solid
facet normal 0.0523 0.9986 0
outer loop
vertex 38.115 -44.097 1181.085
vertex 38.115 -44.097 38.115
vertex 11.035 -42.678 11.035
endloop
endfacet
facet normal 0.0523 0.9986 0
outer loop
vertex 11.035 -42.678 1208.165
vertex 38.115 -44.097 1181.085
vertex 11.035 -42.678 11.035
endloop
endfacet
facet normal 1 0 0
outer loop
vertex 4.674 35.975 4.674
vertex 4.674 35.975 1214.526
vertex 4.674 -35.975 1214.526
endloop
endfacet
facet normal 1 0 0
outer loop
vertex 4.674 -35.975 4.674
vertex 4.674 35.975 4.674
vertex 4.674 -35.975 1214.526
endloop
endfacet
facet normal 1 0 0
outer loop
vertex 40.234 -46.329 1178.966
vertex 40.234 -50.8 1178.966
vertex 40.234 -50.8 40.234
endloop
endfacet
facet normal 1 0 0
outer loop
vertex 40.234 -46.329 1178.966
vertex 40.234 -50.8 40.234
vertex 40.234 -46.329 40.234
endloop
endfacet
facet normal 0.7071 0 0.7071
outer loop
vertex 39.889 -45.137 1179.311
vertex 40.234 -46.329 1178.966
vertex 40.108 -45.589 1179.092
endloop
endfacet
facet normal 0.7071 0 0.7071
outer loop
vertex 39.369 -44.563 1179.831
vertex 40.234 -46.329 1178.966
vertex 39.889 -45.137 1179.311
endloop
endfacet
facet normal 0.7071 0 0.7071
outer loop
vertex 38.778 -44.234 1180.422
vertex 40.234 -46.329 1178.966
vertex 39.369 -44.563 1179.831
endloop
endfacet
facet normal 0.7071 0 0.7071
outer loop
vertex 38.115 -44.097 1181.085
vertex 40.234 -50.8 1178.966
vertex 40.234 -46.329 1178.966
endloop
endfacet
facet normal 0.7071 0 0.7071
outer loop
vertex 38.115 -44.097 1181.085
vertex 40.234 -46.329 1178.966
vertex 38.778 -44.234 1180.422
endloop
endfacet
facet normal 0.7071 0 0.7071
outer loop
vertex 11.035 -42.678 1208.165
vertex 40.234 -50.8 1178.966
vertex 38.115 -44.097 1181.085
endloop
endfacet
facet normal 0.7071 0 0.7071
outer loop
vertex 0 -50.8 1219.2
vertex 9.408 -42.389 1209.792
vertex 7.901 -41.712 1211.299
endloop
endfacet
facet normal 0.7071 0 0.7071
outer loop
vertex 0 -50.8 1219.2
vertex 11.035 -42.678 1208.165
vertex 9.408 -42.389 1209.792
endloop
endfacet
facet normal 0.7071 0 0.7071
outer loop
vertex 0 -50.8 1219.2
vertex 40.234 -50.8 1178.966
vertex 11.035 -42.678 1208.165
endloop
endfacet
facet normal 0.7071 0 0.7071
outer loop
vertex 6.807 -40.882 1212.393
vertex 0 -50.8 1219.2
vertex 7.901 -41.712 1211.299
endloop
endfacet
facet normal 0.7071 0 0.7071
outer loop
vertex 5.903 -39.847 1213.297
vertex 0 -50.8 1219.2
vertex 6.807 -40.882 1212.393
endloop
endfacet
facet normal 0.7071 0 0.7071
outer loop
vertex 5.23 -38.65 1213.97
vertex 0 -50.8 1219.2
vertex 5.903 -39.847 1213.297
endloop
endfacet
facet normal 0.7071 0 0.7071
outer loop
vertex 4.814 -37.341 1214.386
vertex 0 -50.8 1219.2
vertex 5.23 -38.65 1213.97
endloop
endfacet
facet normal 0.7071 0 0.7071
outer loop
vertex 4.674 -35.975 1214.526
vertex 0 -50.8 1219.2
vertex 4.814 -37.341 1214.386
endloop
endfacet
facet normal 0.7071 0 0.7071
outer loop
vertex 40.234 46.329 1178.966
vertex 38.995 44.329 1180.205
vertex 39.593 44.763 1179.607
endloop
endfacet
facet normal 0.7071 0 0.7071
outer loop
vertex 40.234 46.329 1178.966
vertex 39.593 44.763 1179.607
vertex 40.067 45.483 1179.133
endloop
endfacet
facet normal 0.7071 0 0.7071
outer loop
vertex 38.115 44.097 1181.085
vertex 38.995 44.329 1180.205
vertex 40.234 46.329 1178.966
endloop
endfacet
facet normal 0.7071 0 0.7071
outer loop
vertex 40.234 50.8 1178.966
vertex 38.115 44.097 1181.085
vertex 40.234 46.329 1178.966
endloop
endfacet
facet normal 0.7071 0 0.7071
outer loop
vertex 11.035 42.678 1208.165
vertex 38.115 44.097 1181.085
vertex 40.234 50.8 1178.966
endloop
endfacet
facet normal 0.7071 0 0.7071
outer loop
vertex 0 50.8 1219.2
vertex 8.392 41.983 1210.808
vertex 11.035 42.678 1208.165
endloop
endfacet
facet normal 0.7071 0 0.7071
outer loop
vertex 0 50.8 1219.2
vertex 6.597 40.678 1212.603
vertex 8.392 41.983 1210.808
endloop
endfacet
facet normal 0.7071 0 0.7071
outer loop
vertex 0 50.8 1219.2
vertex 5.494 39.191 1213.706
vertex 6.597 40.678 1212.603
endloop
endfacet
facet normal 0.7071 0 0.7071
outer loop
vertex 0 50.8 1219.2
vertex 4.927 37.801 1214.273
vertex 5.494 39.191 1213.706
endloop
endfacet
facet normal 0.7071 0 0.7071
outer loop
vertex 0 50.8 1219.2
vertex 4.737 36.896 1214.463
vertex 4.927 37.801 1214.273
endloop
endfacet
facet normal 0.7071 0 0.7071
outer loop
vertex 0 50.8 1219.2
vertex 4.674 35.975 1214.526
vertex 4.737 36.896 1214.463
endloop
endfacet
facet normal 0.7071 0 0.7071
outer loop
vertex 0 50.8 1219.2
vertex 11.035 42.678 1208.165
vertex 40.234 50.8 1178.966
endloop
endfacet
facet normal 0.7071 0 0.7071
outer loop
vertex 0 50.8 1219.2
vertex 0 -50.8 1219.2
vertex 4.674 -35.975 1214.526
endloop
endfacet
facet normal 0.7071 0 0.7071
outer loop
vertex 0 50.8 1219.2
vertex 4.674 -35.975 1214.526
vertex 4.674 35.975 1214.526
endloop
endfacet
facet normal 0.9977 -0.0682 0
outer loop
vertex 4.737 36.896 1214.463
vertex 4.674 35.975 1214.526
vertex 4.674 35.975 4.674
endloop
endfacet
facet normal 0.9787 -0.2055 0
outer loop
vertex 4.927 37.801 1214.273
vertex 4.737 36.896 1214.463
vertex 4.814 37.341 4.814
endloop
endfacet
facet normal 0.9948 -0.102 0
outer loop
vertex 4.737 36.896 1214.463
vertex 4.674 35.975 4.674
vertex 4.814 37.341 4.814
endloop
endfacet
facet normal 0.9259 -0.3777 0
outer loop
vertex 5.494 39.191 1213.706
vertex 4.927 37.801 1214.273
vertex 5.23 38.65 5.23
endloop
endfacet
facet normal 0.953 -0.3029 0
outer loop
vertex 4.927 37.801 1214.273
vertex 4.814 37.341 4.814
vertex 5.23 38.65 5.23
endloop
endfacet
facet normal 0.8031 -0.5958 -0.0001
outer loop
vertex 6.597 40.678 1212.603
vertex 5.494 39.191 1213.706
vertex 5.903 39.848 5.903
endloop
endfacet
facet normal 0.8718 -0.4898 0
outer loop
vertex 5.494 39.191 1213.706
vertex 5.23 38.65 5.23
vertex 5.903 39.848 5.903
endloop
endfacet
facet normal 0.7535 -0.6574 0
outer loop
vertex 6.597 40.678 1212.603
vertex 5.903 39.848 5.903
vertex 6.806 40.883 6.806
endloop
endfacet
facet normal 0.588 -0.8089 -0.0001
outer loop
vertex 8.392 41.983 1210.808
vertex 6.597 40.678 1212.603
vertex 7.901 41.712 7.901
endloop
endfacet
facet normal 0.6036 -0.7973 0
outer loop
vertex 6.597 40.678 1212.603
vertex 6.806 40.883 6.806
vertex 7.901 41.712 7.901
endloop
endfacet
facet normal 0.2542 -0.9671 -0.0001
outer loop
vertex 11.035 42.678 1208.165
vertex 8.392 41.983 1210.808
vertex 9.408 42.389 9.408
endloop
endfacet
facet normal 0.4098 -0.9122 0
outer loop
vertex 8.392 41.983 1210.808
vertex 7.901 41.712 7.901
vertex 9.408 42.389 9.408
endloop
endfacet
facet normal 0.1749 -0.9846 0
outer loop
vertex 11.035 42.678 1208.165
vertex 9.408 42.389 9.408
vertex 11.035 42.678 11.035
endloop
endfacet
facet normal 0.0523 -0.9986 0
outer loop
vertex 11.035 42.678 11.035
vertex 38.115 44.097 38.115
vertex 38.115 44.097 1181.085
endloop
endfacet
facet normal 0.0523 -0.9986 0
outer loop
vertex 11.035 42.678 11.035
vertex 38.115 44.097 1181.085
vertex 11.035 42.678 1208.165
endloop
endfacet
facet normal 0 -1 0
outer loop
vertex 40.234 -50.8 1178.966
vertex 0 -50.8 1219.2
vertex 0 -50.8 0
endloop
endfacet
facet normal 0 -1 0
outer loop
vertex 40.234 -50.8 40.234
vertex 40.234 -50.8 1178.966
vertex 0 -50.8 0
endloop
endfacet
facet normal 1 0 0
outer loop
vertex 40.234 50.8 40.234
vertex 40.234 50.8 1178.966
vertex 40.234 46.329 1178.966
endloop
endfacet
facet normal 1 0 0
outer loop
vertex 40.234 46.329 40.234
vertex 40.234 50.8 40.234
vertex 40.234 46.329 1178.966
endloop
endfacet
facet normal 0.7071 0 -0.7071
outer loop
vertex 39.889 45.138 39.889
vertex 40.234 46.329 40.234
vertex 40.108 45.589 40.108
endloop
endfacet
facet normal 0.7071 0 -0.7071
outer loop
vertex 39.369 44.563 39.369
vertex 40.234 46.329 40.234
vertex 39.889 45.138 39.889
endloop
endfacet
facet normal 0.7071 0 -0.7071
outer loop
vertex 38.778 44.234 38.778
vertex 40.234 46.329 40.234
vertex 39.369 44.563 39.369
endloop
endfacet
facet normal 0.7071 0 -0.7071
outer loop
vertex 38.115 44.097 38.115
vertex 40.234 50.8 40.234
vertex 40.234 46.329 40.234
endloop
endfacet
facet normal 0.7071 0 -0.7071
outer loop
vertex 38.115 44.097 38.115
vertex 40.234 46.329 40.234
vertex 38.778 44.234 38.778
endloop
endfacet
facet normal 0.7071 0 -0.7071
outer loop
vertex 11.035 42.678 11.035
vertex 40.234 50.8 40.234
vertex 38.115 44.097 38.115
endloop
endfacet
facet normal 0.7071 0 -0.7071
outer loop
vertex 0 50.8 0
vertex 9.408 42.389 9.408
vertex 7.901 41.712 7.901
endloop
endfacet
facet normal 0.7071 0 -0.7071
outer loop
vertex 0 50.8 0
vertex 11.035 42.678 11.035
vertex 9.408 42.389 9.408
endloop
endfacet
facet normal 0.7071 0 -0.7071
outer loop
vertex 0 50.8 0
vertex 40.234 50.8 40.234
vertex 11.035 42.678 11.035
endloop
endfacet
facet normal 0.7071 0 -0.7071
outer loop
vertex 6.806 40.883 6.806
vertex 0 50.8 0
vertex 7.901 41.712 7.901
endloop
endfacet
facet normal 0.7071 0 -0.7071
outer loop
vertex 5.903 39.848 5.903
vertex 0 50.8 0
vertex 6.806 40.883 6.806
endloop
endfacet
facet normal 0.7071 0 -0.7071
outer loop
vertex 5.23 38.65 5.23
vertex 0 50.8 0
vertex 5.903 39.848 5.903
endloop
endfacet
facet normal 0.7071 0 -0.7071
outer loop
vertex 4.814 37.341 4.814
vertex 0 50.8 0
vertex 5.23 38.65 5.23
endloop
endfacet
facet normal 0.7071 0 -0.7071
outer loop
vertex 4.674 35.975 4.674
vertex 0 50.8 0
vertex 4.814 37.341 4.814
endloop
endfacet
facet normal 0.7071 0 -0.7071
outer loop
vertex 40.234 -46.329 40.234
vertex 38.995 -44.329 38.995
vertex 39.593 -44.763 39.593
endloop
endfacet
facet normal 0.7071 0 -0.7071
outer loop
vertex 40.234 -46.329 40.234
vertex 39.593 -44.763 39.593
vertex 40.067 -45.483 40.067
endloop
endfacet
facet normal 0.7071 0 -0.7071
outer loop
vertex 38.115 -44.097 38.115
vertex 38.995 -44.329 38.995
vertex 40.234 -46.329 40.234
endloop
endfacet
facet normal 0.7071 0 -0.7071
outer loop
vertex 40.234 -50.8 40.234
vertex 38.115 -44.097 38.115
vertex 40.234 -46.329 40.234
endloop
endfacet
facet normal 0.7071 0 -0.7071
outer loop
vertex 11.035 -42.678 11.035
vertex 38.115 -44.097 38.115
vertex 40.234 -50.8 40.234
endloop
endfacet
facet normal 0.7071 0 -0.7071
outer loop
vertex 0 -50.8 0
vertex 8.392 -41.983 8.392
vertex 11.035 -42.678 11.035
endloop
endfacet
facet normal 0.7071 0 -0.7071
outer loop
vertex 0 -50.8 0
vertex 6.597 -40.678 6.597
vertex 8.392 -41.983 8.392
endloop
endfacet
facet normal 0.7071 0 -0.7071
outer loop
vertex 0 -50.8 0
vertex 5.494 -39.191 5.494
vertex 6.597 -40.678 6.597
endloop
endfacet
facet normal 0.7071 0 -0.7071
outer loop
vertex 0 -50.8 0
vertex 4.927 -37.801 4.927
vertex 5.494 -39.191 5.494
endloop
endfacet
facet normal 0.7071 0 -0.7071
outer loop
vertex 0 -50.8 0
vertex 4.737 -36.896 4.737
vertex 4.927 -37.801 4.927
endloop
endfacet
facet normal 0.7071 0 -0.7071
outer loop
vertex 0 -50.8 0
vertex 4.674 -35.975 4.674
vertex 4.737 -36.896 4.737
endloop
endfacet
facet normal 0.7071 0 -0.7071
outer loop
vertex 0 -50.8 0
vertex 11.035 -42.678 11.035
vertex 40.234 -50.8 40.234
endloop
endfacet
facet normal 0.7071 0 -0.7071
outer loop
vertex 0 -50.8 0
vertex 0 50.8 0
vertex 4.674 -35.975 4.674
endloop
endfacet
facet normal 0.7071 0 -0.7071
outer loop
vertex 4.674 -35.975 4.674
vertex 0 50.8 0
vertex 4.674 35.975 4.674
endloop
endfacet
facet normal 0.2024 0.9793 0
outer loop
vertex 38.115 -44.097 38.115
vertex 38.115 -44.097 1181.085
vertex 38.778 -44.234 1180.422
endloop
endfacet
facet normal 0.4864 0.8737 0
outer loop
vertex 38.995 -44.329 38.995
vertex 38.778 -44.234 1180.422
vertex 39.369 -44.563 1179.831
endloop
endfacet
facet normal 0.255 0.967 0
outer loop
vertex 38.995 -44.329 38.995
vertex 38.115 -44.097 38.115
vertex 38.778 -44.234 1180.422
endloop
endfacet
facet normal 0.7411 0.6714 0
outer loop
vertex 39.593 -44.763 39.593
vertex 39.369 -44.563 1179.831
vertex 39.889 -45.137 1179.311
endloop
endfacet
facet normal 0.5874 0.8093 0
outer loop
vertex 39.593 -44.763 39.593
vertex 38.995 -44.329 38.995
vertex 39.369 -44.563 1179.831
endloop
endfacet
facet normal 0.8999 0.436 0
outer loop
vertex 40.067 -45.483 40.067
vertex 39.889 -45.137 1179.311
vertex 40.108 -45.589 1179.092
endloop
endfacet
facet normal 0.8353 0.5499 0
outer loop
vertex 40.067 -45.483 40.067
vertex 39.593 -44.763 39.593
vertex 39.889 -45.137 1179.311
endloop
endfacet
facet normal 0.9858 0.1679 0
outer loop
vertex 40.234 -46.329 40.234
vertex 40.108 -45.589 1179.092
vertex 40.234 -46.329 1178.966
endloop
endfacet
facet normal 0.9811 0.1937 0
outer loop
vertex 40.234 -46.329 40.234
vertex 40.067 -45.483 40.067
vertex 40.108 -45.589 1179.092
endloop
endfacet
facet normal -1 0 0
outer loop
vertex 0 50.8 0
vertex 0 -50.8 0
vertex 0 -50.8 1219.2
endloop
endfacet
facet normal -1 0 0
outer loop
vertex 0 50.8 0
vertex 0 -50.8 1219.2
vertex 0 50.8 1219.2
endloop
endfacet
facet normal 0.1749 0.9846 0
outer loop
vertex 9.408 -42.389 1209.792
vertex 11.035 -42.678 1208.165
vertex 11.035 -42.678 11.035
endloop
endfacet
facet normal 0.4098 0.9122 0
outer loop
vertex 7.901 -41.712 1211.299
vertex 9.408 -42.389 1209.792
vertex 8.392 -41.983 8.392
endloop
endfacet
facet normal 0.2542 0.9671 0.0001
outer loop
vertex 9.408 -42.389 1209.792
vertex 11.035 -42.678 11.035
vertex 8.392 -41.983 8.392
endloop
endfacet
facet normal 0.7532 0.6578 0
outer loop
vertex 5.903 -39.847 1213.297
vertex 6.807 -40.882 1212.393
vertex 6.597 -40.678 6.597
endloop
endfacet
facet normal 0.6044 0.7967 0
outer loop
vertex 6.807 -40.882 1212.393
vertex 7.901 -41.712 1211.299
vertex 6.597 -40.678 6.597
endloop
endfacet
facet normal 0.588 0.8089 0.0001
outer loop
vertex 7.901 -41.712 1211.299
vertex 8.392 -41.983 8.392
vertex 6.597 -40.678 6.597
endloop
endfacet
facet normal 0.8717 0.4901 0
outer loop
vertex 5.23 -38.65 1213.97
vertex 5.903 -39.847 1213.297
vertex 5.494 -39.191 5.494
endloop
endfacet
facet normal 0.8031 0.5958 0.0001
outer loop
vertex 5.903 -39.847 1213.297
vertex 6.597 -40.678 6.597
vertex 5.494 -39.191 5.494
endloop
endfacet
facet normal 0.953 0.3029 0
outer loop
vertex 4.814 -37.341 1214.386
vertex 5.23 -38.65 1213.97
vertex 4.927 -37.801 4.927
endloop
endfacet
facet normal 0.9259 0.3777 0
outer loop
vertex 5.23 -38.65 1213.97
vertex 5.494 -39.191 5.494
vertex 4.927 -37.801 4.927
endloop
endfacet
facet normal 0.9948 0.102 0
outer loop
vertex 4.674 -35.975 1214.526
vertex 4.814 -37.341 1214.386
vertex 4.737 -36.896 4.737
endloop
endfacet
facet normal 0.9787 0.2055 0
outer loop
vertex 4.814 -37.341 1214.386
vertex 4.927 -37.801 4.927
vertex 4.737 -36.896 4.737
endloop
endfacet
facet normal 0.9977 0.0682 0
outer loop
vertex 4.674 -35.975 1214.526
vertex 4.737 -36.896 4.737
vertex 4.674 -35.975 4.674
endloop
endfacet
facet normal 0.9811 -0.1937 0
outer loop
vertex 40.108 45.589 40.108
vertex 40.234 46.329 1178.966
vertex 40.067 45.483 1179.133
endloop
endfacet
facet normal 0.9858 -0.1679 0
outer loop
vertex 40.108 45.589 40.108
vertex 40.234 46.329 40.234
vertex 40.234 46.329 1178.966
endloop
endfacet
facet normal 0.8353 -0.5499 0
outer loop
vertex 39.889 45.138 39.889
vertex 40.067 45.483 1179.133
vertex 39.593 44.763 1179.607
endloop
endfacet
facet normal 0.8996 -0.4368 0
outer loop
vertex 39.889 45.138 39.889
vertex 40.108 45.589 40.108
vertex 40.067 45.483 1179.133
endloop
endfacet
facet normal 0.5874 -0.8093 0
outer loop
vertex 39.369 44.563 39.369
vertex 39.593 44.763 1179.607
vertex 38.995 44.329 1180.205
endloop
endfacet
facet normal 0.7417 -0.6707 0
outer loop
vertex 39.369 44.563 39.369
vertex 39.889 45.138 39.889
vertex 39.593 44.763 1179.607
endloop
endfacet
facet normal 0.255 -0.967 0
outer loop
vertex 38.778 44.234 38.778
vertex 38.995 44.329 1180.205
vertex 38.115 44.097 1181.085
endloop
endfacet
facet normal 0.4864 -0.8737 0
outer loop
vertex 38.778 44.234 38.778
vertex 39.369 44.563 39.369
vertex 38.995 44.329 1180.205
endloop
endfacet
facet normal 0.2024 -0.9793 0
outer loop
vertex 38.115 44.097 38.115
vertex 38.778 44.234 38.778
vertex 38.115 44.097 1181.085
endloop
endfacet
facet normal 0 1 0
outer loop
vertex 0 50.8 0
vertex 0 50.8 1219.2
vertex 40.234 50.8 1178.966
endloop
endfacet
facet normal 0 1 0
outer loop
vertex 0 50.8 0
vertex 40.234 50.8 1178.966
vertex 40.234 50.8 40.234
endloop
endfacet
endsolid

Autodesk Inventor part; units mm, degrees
ref_plane "Start plane" through (0, 0, 0) normal (0, 0, 1) x (1, 0, 0)
ref_plane "End plane" through (0, 0, 1219.2) normal (0, 0, 1) x (1, 0, 0)
sketch "Sketch" plane through (0, 0, 0) normal (0, 0, 1) x (1, 0, 0)
  line L0 (0, 0) -> (0, 50.8)
  line L1 (0, 50.8) -> (40.2336, 50.8)
  line L2 (40.2336, 50.8) -> (40.2336, 46.3293)
  line L3 (38.1154, 44.0972) -> (11.035, 42.6782)
  line L4 (4.6736, 35.9747) -> (4.6736, 0)
  line L5 (4.6736, 0) -> (0, 0) construction
  line L6 (22.5508, 50.8) -> (22.5508, 43.2816) construction
  line L7 (40.2336, 44.2082) -> (40.2336, 43.2816) construction
  line L8 (40.2336, 43.2816) -> (22.5508, 43.2816) construction
  line L9 (0, 15) -> (0, -27) construction
  line L10 (-5.539, 0) -> (16.0067, 0) construction
  line L11 (0, 0) -> (0, -50.8)
  line L12 (0, -50.8) -> (40.2336, -50.8)
  line L13 (40.2336, -50.8) -> (40.2336, -46.3293)
  line L14 (38.1154, -44.0972) -> (11.035, -42.6782)
  line L15 (4.6736, -35.9747) -> (4.6736, 0)
  arc A0 (11.035, 42.6782) -> (4.6736, 35.9747) centre (11.3862, 35.9747) ccw
  arc A1 (4.6736, -35.9747) -> (11.035, -42.6782) centre (11.3862, -35.9747) ccw
  arc A2 (38.1154, 44.0972) -> (40.2336, 46.3293) centre (37.9984, 46.3293) ccw
  arc A3 (40.2336, -46.3293) -> (38.1154, -44.0972) centre (37.9984, -46.3293) ccw
  line L16 (0, 71.12) -> (0, -71.12) construction
  line L17 (-14.7825, 0) -> (49.9224, 0) construction
  point P0 (4.6736, 42.3448)
  point P1 (40.2336, -44.2082)
  point P2 (4.6736, -42.3448)
  point P3 (22.5508, -50.8)
  point P4 (22.5508, -43.2816)
  dimension "d0" = 4.6736
  dimension "d1" = 50.8
  dimension "d2" = 40.2336
  dimension "d3" = 7.5184
  dimension "d4" = 17.6828
  dimension "d5" = 0.9266
  dimension "d25" = 0
  dimension "d28" = 6.7127
  dimension "d29" = 2.2352
extrude "Body" add sketch "Sketch" along normal up to surface (1219.2 mm away) from surface at 0
sketch "Sketch3" plane through (0, 0, 0) normal (0, 0, 1) x (1, 0, 0)
  line L0 (0, 0) -> (10, 0)
ref_plane "Work Plane3" through (0, 0, 0) normal (0, -1, 0) x (1, 0, 0)
sketch "Sketch4" plane through (0, 0, 0) normal (0, -1, 0) x (1, 0, 0)
  line L0 (-2, 0) -> (12, 0)
  line L1 (-2, 1219.2) -> (12, 1219.2)
  dimension "d31" = 1219.2
ref_plane "Work Plane4" through (0, 0, 1219.2) normal (0.7071, 0, 0.7071) x (0.7071, 0, -0.7071)
split "Split1" plane through (0, 0, 1219.2) removes the side toward (0.7071, 0, 0.7071)
ref_plane "Work Plane5" through (0, 0, 0) normal (0.7071, 0, -0.7071) x (-0.7071, 0, -0.7071)
split "Split2" plane through (0, 0, 0) removes the side toward (0.7071, 0, -0.7071)
equation "\"d0\" = G_T"
equation "\"d1\" = 0.5 * G_H"
equation "\"d2\" = G_W"
equation "\"d3\" = G_T1"
equation "\"d4\" = G_C"
equation "\"d28\" = G_IR"
equation "\"d29\" = G_ER"
equation "\"d6\" = G_L"
equation "\"G_W\" = 40.2336"
equation "\"G_H\" = 101.6"
equation "\"G_T\" = 4.6736"
equation "\"G_T1\" = 7.5184"
equation "\"G_NG\" = 0.0524"
equation "\"G_ER\" = 2.2352"
equation "\"G_IR\" = 6.71265"
equation "\"G_C\" = 17.68285"
equation "\"G_L\" = d31"
equation "\"ex\" = 0"
equation "\"G_OFFSET_START\" = 0"
equation "\"G_OFFSET_END\" = 0"
equation "\"d27\" = G_OFFSET_END + B_L"
equation "\"B_L\" = 1219.2"
properties part number "AISC - C 4 x 5.4 - 48" material "Steel, Mild"
